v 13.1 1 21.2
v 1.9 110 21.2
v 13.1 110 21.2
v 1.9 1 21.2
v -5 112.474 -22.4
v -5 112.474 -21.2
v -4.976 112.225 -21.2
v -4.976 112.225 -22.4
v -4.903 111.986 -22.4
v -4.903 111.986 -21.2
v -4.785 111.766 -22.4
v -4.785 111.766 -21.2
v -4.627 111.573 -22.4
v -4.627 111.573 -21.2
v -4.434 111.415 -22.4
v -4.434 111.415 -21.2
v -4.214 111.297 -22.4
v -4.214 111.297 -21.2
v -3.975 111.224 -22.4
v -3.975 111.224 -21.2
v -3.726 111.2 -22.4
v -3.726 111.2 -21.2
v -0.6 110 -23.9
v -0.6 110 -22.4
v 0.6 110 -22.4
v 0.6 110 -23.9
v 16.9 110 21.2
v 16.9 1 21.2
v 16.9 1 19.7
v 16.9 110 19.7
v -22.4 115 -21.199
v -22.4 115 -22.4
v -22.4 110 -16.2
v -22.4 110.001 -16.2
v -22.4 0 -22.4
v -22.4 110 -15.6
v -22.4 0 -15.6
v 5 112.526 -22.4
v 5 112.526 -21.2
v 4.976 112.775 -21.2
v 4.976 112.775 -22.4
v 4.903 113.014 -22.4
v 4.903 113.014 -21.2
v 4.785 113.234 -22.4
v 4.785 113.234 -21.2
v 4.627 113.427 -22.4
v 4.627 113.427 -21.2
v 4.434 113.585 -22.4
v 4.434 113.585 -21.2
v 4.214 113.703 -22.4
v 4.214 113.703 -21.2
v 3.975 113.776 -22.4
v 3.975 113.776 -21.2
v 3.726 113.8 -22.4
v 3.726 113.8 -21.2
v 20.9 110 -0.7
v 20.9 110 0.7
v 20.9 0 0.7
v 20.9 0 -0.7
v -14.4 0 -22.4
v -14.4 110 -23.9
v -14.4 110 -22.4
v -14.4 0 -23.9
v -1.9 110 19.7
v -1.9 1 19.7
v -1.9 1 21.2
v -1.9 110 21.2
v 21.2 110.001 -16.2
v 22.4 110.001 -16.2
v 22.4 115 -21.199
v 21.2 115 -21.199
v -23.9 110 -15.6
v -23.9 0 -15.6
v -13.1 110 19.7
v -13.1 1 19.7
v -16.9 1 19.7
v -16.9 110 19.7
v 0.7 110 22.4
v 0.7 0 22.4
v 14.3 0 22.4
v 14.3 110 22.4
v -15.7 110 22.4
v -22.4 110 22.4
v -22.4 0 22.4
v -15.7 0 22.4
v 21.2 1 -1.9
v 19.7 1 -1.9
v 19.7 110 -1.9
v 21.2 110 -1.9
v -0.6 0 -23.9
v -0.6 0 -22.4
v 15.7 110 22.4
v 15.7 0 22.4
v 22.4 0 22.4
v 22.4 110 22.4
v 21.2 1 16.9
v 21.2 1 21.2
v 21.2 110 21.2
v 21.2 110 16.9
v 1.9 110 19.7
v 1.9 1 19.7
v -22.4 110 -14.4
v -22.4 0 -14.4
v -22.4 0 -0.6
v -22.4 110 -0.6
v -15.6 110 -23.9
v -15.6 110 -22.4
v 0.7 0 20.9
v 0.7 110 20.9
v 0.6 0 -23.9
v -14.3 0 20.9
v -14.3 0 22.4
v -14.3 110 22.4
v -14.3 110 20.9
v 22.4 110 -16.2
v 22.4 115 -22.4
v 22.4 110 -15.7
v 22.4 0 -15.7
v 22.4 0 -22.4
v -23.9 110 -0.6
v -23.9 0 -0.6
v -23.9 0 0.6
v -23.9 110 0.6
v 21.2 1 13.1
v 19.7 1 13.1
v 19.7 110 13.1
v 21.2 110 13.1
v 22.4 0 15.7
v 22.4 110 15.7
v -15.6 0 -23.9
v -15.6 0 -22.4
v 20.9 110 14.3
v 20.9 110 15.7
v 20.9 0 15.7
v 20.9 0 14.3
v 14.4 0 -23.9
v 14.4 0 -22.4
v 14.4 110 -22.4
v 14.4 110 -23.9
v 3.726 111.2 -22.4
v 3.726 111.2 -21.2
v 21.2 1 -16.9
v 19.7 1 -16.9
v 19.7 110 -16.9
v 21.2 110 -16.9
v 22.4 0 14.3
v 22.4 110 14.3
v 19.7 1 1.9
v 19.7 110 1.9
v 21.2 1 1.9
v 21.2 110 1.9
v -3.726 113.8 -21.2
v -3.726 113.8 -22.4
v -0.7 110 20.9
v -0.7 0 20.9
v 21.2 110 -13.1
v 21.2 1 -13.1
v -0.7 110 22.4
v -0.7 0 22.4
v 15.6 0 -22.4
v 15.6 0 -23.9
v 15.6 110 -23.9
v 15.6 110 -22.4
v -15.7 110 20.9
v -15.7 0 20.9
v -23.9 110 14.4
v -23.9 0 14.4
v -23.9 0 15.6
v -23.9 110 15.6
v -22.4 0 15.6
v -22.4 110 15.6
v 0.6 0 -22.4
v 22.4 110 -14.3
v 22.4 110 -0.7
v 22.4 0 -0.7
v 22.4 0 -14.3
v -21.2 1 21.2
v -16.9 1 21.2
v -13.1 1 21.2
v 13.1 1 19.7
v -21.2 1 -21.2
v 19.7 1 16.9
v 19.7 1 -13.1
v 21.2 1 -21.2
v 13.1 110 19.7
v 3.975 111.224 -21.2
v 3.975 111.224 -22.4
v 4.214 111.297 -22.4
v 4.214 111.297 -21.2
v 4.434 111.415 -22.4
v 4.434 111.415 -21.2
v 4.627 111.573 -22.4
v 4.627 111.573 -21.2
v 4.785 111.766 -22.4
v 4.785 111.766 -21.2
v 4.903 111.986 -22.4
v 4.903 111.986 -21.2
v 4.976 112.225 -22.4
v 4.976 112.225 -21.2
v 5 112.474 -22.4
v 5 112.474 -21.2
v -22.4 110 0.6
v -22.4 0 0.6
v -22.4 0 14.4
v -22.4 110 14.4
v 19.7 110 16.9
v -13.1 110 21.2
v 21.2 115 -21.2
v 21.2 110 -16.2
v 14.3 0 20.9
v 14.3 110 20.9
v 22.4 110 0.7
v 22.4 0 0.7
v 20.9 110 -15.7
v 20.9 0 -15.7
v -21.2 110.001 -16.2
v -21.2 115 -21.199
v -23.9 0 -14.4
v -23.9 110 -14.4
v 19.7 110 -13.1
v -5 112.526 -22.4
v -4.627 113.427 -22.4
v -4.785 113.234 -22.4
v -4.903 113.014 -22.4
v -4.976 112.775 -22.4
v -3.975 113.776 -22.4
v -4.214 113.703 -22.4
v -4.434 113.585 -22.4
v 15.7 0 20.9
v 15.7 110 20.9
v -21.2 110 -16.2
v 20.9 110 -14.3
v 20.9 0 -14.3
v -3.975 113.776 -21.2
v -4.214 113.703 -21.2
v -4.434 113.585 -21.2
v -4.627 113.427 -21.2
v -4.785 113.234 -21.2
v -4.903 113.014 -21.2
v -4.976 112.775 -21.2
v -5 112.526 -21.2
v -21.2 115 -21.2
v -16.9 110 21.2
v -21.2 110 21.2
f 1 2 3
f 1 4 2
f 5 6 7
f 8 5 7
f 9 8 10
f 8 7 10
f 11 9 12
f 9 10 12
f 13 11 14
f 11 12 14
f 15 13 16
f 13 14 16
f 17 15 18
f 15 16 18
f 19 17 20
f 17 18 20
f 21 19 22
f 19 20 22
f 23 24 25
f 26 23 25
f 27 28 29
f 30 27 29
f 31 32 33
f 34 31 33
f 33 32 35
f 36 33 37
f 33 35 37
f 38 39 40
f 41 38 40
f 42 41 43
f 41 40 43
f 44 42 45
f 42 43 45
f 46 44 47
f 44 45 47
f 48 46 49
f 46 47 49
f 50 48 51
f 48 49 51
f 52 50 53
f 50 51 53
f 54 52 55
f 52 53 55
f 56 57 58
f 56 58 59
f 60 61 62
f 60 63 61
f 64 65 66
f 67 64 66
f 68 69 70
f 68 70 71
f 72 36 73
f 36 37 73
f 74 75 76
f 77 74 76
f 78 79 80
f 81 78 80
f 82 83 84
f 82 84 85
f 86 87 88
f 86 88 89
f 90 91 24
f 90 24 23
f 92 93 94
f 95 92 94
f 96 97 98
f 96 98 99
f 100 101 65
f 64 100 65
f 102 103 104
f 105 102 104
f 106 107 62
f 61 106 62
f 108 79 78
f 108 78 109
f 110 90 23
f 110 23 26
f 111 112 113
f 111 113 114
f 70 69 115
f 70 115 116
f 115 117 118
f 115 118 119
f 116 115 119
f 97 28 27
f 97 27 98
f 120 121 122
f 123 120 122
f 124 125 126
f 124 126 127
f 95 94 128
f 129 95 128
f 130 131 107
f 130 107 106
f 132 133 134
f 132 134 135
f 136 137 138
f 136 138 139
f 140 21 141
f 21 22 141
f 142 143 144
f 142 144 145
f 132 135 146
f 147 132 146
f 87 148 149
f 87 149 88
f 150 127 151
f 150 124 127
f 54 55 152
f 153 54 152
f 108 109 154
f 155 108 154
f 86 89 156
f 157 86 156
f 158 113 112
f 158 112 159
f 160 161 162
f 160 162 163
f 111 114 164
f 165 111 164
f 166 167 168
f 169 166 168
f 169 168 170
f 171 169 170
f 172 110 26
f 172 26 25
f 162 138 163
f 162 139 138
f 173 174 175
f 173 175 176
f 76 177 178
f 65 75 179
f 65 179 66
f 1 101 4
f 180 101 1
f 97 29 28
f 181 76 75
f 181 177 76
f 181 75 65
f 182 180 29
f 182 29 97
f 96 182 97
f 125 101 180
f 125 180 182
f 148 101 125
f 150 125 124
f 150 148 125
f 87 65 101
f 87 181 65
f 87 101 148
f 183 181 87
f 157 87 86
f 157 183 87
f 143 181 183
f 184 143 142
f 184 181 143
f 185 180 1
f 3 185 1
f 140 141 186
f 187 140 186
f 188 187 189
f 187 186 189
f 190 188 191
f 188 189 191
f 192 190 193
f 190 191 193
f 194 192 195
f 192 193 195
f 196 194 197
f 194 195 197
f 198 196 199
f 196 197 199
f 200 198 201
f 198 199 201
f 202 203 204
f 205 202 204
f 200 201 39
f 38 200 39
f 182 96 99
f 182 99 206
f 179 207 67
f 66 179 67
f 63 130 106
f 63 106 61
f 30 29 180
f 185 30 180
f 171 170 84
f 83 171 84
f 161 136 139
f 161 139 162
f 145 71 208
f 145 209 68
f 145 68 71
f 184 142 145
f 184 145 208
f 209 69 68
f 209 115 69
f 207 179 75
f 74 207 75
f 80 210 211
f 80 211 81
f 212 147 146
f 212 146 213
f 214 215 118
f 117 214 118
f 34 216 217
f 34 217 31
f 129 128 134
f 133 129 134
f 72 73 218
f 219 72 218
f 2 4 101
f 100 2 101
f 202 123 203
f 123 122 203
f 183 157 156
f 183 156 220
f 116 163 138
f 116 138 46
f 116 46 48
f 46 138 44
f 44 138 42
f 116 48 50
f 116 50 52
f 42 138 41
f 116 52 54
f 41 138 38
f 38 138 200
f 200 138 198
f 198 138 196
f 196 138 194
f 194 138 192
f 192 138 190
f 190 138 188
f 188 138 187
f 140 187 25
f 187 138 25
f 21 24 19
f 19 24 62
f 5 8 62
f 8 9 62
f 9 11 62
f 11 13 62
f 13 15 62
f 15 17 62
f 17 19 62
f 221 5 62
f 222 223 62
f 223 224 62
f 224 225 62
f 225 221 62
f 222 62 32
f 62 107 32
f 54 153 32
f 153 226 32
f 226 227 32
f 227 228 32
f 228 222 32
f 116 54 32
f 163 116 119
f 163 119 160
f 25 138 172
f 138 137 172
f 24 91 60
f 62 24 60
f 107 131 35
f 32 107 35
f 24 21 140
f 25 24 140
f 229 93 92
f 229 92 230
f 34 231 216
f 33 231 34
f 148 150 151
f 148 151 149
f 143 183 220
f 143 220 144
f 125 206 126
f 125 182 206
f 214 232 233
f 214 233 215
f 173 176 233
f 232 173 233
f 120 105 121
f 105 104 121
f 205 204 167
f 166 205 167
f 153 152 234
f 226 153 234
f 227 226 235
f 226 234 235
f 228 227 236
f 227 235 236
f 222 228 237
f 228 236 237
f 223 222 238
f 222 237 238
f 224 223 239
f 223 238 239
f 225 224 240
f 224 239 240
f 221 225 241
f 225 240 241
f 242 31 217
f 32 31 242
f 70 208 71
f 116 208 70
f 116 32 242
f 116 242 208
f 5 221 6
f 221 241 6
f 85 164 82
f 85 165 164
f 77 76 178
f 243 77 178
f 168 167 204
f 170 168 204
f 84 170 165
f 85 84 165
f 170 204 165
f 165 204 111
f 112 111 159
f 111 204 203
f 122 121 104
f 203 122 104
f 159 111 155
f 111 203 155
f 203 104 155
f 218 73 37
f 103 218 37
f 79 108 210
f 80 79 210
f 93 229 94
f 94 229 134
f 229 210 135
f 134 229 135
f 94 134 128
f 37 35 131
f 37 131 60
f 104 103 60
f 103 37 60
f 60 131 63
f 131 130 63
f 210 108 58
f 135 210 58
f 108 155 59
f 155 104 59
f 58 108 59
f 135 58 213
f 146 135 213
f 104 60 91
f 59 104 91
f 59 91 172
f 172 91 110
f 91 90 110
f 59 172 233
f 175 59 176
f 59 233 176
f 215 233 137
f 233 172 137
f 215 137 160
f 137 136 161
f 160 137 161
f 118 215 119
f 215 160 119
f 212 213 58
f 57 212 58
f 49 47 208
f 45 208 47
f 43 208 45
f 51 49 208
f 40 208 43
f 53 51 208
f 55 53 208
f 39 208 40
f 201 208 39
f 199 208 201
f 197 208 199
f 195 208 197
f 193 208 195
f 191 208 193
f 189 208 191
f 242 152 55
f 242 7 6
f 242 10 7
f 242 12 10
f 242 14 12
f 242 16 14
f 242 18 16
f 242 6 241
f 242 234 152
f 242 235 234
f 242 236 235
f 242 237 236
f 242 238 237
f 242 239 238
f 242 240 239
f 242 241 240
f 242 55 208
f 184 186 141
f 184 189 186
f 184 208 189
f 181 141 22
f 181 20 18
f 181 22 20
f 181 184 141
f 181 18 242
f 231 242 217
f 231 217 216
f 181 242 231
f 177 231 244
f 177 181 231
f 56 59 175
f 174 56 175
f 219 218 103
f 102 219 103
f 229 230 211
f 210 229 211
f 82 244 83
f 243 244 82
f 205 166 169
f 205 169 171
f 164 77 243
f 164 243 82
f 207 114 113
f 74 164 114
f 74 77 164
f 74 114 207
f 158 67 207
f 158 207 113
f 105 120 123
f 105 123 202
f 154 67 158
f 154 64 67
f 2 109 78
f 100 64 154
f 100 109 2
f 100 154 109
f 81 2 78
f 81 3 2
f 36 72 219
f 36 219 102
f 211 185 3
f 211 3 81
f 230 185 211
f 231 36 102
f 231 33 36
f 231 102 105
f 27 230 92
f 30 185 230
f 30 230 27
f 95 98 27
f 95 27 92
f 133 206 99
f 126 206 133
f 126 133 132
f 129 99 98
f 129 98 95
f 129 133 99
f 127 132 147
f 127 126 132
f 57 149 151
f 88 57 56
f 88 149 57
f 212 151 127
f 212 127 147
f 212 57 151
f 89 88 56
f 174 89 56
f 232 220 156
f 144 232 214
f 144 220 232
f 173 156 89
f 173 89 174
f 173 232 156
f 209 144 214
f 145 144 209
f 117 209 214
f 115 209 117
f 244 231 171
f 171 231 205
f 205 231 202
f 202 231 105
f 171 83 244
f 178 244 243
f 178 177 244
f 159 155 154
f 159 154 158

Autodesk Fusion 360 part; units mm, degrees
sketch "Body" plane through (0, 0, 0) normal (0, 1, 0) x (1, 0, 0)
  line L0 (-22.5, -22.5) -> (22.5, -22.5)
  line L1 (22.5, -22.5) -> (22.5, 22.5)
  line L2 (22.5, 22.5) -> (-22.5, 22.5)
  line L3 (-22.5, 22.5) -> (-22.5, -22.5)
  line L4 (-22.5, -22.5) -> (22.5, 22.5) construction
  line L5 (22.5, -22.5) -> (-22.5, 22.5) construction
  line L6 (22.4, 22.4) -> (-22.4, 22.4)
  line L7 (-22.4, 22.4) -> (-22.4, -22.4)
  line L8 (-22.4, -22.4) -> (22.4, -22.4)
  line L9 (22.4, -22.4) -> (22.4, 22.4)
  line L10 (-21.2, 21.2) -> (-21.2, -21.2)
  line L11 (-21.2, -21.2) -> (21.2, -21.2)
  line L12 (21.2, -21.2) -> (21.2, 21.2)
  line L13 (21.2, 21.2) -> (-21.2, 21.2)
  line L14 (-22.5, -22.5) -> (-15.7, -22.5) construction
  line L15 (-15.7, -22.5) -> (-15.7, -22.4) construction
  line L16 (-15.7, -22.4) -> (-22.5, -22.4) construction
  line L17 (-22.5, -22.4) -> (-22.5, -22.5) construction
  line L18 (-22.5, -22.5) -> (-22.4, -22.5) construction
  line L19 (-22.4, -22.5) -> (-22.4, -14.4) construction
  line L20 (-22.4, -14.4) -> (-22.5, -14.4) construction
  line L21 (-22.5, -14.4) -> (-22.5, -22.5) construction
  line L22 (-22.4, -14.4) -> (-23.9, -14.4)
  line L23 (-23.9, -14.4) -> (-23.9, -15.6)
  line L24 (-23.9, -15.6) -> (-22.4, -15.6)
  line L25 (-22.4, -15.6) -> (-22.4, -14.4)
  line L26 (-15.7, -22.4) -> (-14.3, -22.4)
  line L27 (-14.3, -22.4) -> (-14.3, -20.9)
  line L28 (-14.3, -20.9) -> (-15.7, -20.9)
  line L29 (-15.7, -20.9) -> (-15.7, -22.4)
  line L30 (-13.1, -22.4) -> (-13.1, -19.7)
  line L31 (-13.1, -19.7) -> (-16.9, -19.7)
  line L32 (-16.9, -19.7) -> (-16.9, -22.4)
  line L33 (0, -22.5) -> (0, -28) construction
  line L34 (-22.5, 0) -> (-38.981, 0) construction
  line L35 (-22.5, 22.5) -> (-14.4, 22.5) construction
  line L36 (-14.4, 22.5) -> (-14.4, 22.4) construction
  line L37 (-14.4, 22.4) -> (-22.5, 22.4) construction
  line L38 (-22.5, 22.4) -> (-22.5, 22.5) construction
  line L39 (22.5, -22.5) -> (22.4, -22.5) construction
  line L40 (22.4, -22.5) -> (22.4, -15.7) construction
  line L41 (22.4, -15.7) -> (22.5, -15.7) construction
  line L42 (22.5, -15.7) -> (22.5, -22.5) construction
  line L43 (-14.4, 22.4) -> (-15.6, 22.4)
  line L44 (-15.6, 22.4) -> (-15.6, 23.9)
  line L45 (-15.6, 23.9) -> (-14.4, 23.9)
  line L46 (-14.4, 23.9) -> (-14.4, 22.4)
  line L47 (22.4, 16.2) -> (-22.4, 16.2)
  line L48 (22.4, -15.7) -> (20.9, -15.7)
  line L49 (20.9, -15.7) -> (20.9, -14.3)
  line L50 (20.9, -14.3) -> (22.4, -14.3)
  line L51 (22.4, -14.3) -> (22.4, -15.7)
  line L52 (22.4, -16.9) -> (19.7, -16.9)
  line L53 (19.7, -16.9) -> (19.7, -13.1)
  line L54 (19.7, -13.1) -> (22.4, -13.1)
  dimension "d39" = 45
  dimension "d40" = 45
  dimension "d43" = 6.8
  dimension "d44" = 0.1
  dimension "d45" = 0.1
  dimension "d46" = 8.1
  dimension "d47" = 1.5
  dimension "d48" = 1.2
  dimension "d49" = 1.4
  dimension "d50" = 1.5
  dimension "d51" = 1.2
  dimension "d66" = 8.1
  dimension "d67" = 0.1
  dimension "d70" = 0.1
  dimension "d71" = 6.8
  dimension "d81" = 1.2
  dimension "d82" = 1.5
  dimension "d196" = 1.5
  dimension "d197" = 1.4
extrude "Extrude1" add sketch "Body" along normal blind 110 contours L7 L8 L10 L11 L25 L32 L47 | L6 L7 L9 L10 L12 L13 L43 L47 | L8 L11 L29 L32 | L8 L11 L26 L27 L29 | L9 L12 L47 L54 | L8 L11 L27 L30 | L9 L12 L50 L54 | L8 L9 L11 L12 L30 L52 | L9 L12 L48 L50 L51 | L9 L12 L48 L52 makes body 1
ref_plane "WorkPlane3" through (0, 55, 0) normal (0, 1, 0) x (0, 0, 1)
sketch "Floor" plane through (0, 55, 0) normal (0, 1, 0) x (1, 0, 0)
  line L0 (-22.5, -22.5) -> (22.5, -22.5)
  line L1 (22.5, -22.5) -> (22.5, 22.5)
  line L2 (22.5, 22.5) -> (-22.5, 22.5)
  line L3 (-22.5, 22.5) -> (-22.5, -22.5)
  line L4 (-22.5, -22.5) -> (22.5, 22.5) construction
  line L5 (22.5, -22.5) -> (-22.5, 22.5) construction
  line L6 (-22.4, 22.4) -> (-22.4, -22.4)
  line L7 (-22.4, -22.4) -> (22.4, -22.4)
  line L8 (22.4, -22.4) -> (22.4, 22.4)
  line L9 (22.4, 22.4) -> (-22.4, 22.4)
  line L10 (-21.3, 21.3) -> (-21.3, -21.3)
  line L11 (-21.3, -21.3) -> (21.3, -21.3)
  line L12 (21.3, -21.3) -> (21.3, 21.3)
  line L13 (21.3, 21.3) -> (-21.3, 21.3)
  line L14 (0, 21.3) -> (-20.6, 21.3) construction
  line L15 (-20.6, 21.3) -> (-20.6, 21.1) construction
  line L16 (-20.6, 21.1) -> (0, 21.1) construction
  line L17 (0, 21.1) -> (0, 21.3) construction
  line L18 (0, 21.3) -> (19.1, 21.3) construction
  line L19 (19.1, 21.3) -> (19.1, 21.1) construction
  line L20 (19.1, 21.1) -> (0, 21.1) construction
  line L21 (0, 21.1) -> (0, 21.3) construction
  line L22 (-20.6, 21.1) -> (-21.7, 21.1)
  line L23 (-21.7, 21.1) -> (-21.7, 20.1)
  line L24 (-21.7, 20.1) -> (-20.6, 20.1)
  line L25 (-20.6, 20.1) -> (-20.6, 21.1)
  line L26 (-21.7, 20.1) -> (-20.6, 21.1)
  line L27 (19.1, 21.1) -> (20.2, 21.1)
  line L28 (20.2, 21.1) -> (20.2, 20.1)
  line L29 (20.2, 20.1) -> (19.1, 20.1)
  line L30 (19.1, 20.1) -> (19.1, 21.1)
  line L31 (19.1, 21.1) -> (20.2, 20.1)
  dimension "d219" = 45
  dimension "d220" = 45
  dimension "d243" = 20.6
  dimension "d244" = 0.2
  dimension "d245" = 19.1
  dimension "d246" = 0.2
  dimension "d247" = 1.1
  dimension "d248" = 1
  dimension "d249" = 1.1
  dimension "d250" = 1
extrude "Extrude19" add sketch "Floor" along normal blind 1 from surface at -55 contours L10 L11 L12 L13 L22 L24 L25 | L10 L22 L26 | L10 L24 L25 L26 | L29 L30 L31 | L27 L28 L31 bodies 1
extrude "Extrude3" add sketch "Body" along normal blind 110 contours L8 L11 L29 L32 | L11 L27 L28 L29 L30 L31 L32 | L8 L11 L27 L30 bodies 1
extrude "Extrude4" cut sketch "Body" along normal blind 110 contours L8 L11 L26 L27 L29 | L11 L27 L28 L29 bodies 1
extrude "Extrude8" add sketch "Body" along normal blind 110 contours L2 L6 L43 L44 L46 | L2 L44 L45 L46 bodies 1
extrude "Extrude5" add sketch "Body" along normal blind 110 contours L3 L22 L23 L24 | L3 L7 L22 L24 L25 bodies 1
extrude "Extrude6" add sketch "Body" along normal blind 110 contours L9 L12 L50 L54 | L12 L48 L49 L50 L52 L53 L54 | L9 L12 L48 L52 bodies 1
extrude "Extrude7" cut sketch "Body" along normal blind 110 contours L9 L12 L48 L50 L51 | L12 L48 L49 L50 bodies 1
pattern_linear "R-Pattern1" count 3 spacing 15 along (1, 0, 0) of "Extrude3", "Extrude4", "Extrude8"
pattern_linear "R-Pattern2" count 3 spacing 15 along (0, 0, -1) of "Extrude5", "Extrude7", "Extrude6"
extrude "Extrude15" add sketch "Body" along normal blind 5 from surface at 110 contours L6 L7 L9 L10 L12 L13 L43 L47 bodies 1
chamfer "Chamfer1" distance 5 angle 45 2 edges at (21.8, 115, -16.2) (-21.8, 115, -16.2) on bodies 1
sketch "Pull Tab Hole" plane through (0, 0, 0) normal (0, 0, 1) x (1, 0, 0)
  line L0 (0, 0) -> (0, 110) construction
  line L1 (0, 110) -> (0, 112.5) construction
  line L2 (3.726, 113.8) -> (-3.726, 113.8)
  line L3 (-5, 112.526) -> (-5, 112.474)
  line L4 (-3.726, 111.2) -> (3.726, 111.2)
  line L5 (5, 112.474) -> (5, 112.526)
  line L6 (5, 113.8) -> (-5, 111.2) construction
  line L7 (-5, 113.8) -> (5, 111.2) construction
  arc A0 (-5, 112.474) -> (-3.726, 111.2) centre (-3.726, 112.474) ccw
  arc A1 (-3.726, 113.8) -> (-5, 112.526) centre (-3.726, 112.526) ccw
  arc A2 (5, 112.526) -> (3.726, 113.8) centre (3.726, 112.526) ccw
  arc A3 (3.726, 111.2) -> (5, 112.474) centre (3.726, 112.474) ccw
  point P0 (0, 112.5)
  dimension "d180" = 110
  dimension "d181" = 2.5
  dimension "d182" = 10
  dimension "d183" = 2.6
  dimension "d184" = 1.274
extrude "Extrude16" cut sketch "Pull Tab Hole" against normal blind 45 bodies 1
copy_body "Body->Comp3" bodies 1 removing the originals makes body 2 in component "Body"
component "Body" placed x (1, 0, 0) y (0, 1, 0) z (0, 0, 1) at (0, 0, 0)
equation "GRID_SPACING = 15 mm"
equation "WALL_THICK = 1.2 mm"
equation "WALL_BUMP = 1.5 mm"
equation "CLEAR = 0.1 mm"
equation "OVERALL_HT = 110 mm"
equation "FLOOR_THICK = 1 mm"
equation "d31 = OVERALL_HT"
equation "d35 = OVERALL_HT"
equation "d37 = OVERALL_HT"
equation "d39 = LENGTH_MODULE_NUMBER * GRID_SPACING"
equation "d40 = WIDTH_MODULE_NUMBER * GRID_SPACING"
equation "d43 = GRID_SPACING / 2 - WALL_THICK / 2 - CLEAR"
equation "d44 = CLEAR"
equation "d45 = CLEAR"
equation "d46 = GRID_SPACING / 2 + WALL_THICK / 2"
equation "d47 = WALL_BUMP"
equation "d48 = WALL_THICK"
equation "d49 = WALL_THICK + CLEAR * 2"
equation "d50 = WALL_BUMP"
equation "d51 = WALL_THICK"
equation "d54 = GRID_SPACING"
equation "d56 = OVERALL_HT"
equation "d60 = GRID_SPACING"
equation "d66 = GRID_SPACING / 2 + WALL_THICK / 2"
equation "d67 = CLEAR"
equation "d70 = CLEAR"
equation "d71 = GRID_SPACING / 2 - WALL_THICK / 2 - CLEAR"
equation "d75 = OVERALL_HT"
equation "d77 = OVERALL_HT"
equation "d79 = OVERALL_HT"
equation "d81 = WALL_THICK"
equation "d82 = WALL_BUMP"
equation "LID_THICK = 3 mm"
equation "LID_TOP_OFFSET = 1 mm"
equation "LID_LOCK_LENGTH = 8 mm"
equation "LID_PULL_WIDTH = 8 mm"
equation "LID_PULL_HT = 1 mm"
equation "LID_PULL_FRONT_OFFSET = 3 mm"
equation "PULL_TAB_WIDTH = PULL_TAB_HT + WALL_THICK"
equation "d173 = OVERALL_HT"
equation "d174 = PULL_TAB_HT"
equation "PULL_TAB_HT = 5 mm"
equation "d179 = PULL_TAB_HT"
equation "d180 = OVERALL_HT"
equation "d181 = PULL_TAB_HT / 2"
equation "d182 = PULL_HOLE_LENGTH"
equation "d183 = PULL_TAB_HT - WALL_THICK * 2"
equation "d184 = ( PULL_TAB_HT - WALL_THICK * 2 ) * 0.49"
equation "PULL_HOLE_LENGTH = 10 mm"
equation "d196 = WALL_BUMP"
equation "d197 = WALL_THICK + CLEAR * 2"
equation "d200 = OVERALL_HT / 2"
equation "d219 = LENGTH_MODULE_NUMBER * GRID_SPACING"
equation "d220 = WIDTH_MODULE_NUMBER * GRID_SPACING"
equation "d223 = FLOOR_THICK"
equation "LID_CLEAR = 0.1 mm"
equation "CHAMFER_LENGTH = 0.5 mm"
equation "CHAMFER_WIDTH = 1 mm"
equation "d243 = Linear Dimension-6"
equation "d244 = LID_CLEAR + CLEAR"
equation "d245 = Linear Dimension-8"
equation "d246 = LID_CLEAR + CLEAR"
equation "d247 = WALL_THICK / 2 + CHAMFER_LENGTH"
equation "d248 = CHAMFER_WIDTH"
equation "d249 = WALL_THICK / 2 + CHAMFER_LENGTH"
equation "d250 = CHAMFER_WIDTH"
equation "d253 = -OVERALL_HT / 2"
equation "LID_LOCK_OFFSET = 0.1 mm"
